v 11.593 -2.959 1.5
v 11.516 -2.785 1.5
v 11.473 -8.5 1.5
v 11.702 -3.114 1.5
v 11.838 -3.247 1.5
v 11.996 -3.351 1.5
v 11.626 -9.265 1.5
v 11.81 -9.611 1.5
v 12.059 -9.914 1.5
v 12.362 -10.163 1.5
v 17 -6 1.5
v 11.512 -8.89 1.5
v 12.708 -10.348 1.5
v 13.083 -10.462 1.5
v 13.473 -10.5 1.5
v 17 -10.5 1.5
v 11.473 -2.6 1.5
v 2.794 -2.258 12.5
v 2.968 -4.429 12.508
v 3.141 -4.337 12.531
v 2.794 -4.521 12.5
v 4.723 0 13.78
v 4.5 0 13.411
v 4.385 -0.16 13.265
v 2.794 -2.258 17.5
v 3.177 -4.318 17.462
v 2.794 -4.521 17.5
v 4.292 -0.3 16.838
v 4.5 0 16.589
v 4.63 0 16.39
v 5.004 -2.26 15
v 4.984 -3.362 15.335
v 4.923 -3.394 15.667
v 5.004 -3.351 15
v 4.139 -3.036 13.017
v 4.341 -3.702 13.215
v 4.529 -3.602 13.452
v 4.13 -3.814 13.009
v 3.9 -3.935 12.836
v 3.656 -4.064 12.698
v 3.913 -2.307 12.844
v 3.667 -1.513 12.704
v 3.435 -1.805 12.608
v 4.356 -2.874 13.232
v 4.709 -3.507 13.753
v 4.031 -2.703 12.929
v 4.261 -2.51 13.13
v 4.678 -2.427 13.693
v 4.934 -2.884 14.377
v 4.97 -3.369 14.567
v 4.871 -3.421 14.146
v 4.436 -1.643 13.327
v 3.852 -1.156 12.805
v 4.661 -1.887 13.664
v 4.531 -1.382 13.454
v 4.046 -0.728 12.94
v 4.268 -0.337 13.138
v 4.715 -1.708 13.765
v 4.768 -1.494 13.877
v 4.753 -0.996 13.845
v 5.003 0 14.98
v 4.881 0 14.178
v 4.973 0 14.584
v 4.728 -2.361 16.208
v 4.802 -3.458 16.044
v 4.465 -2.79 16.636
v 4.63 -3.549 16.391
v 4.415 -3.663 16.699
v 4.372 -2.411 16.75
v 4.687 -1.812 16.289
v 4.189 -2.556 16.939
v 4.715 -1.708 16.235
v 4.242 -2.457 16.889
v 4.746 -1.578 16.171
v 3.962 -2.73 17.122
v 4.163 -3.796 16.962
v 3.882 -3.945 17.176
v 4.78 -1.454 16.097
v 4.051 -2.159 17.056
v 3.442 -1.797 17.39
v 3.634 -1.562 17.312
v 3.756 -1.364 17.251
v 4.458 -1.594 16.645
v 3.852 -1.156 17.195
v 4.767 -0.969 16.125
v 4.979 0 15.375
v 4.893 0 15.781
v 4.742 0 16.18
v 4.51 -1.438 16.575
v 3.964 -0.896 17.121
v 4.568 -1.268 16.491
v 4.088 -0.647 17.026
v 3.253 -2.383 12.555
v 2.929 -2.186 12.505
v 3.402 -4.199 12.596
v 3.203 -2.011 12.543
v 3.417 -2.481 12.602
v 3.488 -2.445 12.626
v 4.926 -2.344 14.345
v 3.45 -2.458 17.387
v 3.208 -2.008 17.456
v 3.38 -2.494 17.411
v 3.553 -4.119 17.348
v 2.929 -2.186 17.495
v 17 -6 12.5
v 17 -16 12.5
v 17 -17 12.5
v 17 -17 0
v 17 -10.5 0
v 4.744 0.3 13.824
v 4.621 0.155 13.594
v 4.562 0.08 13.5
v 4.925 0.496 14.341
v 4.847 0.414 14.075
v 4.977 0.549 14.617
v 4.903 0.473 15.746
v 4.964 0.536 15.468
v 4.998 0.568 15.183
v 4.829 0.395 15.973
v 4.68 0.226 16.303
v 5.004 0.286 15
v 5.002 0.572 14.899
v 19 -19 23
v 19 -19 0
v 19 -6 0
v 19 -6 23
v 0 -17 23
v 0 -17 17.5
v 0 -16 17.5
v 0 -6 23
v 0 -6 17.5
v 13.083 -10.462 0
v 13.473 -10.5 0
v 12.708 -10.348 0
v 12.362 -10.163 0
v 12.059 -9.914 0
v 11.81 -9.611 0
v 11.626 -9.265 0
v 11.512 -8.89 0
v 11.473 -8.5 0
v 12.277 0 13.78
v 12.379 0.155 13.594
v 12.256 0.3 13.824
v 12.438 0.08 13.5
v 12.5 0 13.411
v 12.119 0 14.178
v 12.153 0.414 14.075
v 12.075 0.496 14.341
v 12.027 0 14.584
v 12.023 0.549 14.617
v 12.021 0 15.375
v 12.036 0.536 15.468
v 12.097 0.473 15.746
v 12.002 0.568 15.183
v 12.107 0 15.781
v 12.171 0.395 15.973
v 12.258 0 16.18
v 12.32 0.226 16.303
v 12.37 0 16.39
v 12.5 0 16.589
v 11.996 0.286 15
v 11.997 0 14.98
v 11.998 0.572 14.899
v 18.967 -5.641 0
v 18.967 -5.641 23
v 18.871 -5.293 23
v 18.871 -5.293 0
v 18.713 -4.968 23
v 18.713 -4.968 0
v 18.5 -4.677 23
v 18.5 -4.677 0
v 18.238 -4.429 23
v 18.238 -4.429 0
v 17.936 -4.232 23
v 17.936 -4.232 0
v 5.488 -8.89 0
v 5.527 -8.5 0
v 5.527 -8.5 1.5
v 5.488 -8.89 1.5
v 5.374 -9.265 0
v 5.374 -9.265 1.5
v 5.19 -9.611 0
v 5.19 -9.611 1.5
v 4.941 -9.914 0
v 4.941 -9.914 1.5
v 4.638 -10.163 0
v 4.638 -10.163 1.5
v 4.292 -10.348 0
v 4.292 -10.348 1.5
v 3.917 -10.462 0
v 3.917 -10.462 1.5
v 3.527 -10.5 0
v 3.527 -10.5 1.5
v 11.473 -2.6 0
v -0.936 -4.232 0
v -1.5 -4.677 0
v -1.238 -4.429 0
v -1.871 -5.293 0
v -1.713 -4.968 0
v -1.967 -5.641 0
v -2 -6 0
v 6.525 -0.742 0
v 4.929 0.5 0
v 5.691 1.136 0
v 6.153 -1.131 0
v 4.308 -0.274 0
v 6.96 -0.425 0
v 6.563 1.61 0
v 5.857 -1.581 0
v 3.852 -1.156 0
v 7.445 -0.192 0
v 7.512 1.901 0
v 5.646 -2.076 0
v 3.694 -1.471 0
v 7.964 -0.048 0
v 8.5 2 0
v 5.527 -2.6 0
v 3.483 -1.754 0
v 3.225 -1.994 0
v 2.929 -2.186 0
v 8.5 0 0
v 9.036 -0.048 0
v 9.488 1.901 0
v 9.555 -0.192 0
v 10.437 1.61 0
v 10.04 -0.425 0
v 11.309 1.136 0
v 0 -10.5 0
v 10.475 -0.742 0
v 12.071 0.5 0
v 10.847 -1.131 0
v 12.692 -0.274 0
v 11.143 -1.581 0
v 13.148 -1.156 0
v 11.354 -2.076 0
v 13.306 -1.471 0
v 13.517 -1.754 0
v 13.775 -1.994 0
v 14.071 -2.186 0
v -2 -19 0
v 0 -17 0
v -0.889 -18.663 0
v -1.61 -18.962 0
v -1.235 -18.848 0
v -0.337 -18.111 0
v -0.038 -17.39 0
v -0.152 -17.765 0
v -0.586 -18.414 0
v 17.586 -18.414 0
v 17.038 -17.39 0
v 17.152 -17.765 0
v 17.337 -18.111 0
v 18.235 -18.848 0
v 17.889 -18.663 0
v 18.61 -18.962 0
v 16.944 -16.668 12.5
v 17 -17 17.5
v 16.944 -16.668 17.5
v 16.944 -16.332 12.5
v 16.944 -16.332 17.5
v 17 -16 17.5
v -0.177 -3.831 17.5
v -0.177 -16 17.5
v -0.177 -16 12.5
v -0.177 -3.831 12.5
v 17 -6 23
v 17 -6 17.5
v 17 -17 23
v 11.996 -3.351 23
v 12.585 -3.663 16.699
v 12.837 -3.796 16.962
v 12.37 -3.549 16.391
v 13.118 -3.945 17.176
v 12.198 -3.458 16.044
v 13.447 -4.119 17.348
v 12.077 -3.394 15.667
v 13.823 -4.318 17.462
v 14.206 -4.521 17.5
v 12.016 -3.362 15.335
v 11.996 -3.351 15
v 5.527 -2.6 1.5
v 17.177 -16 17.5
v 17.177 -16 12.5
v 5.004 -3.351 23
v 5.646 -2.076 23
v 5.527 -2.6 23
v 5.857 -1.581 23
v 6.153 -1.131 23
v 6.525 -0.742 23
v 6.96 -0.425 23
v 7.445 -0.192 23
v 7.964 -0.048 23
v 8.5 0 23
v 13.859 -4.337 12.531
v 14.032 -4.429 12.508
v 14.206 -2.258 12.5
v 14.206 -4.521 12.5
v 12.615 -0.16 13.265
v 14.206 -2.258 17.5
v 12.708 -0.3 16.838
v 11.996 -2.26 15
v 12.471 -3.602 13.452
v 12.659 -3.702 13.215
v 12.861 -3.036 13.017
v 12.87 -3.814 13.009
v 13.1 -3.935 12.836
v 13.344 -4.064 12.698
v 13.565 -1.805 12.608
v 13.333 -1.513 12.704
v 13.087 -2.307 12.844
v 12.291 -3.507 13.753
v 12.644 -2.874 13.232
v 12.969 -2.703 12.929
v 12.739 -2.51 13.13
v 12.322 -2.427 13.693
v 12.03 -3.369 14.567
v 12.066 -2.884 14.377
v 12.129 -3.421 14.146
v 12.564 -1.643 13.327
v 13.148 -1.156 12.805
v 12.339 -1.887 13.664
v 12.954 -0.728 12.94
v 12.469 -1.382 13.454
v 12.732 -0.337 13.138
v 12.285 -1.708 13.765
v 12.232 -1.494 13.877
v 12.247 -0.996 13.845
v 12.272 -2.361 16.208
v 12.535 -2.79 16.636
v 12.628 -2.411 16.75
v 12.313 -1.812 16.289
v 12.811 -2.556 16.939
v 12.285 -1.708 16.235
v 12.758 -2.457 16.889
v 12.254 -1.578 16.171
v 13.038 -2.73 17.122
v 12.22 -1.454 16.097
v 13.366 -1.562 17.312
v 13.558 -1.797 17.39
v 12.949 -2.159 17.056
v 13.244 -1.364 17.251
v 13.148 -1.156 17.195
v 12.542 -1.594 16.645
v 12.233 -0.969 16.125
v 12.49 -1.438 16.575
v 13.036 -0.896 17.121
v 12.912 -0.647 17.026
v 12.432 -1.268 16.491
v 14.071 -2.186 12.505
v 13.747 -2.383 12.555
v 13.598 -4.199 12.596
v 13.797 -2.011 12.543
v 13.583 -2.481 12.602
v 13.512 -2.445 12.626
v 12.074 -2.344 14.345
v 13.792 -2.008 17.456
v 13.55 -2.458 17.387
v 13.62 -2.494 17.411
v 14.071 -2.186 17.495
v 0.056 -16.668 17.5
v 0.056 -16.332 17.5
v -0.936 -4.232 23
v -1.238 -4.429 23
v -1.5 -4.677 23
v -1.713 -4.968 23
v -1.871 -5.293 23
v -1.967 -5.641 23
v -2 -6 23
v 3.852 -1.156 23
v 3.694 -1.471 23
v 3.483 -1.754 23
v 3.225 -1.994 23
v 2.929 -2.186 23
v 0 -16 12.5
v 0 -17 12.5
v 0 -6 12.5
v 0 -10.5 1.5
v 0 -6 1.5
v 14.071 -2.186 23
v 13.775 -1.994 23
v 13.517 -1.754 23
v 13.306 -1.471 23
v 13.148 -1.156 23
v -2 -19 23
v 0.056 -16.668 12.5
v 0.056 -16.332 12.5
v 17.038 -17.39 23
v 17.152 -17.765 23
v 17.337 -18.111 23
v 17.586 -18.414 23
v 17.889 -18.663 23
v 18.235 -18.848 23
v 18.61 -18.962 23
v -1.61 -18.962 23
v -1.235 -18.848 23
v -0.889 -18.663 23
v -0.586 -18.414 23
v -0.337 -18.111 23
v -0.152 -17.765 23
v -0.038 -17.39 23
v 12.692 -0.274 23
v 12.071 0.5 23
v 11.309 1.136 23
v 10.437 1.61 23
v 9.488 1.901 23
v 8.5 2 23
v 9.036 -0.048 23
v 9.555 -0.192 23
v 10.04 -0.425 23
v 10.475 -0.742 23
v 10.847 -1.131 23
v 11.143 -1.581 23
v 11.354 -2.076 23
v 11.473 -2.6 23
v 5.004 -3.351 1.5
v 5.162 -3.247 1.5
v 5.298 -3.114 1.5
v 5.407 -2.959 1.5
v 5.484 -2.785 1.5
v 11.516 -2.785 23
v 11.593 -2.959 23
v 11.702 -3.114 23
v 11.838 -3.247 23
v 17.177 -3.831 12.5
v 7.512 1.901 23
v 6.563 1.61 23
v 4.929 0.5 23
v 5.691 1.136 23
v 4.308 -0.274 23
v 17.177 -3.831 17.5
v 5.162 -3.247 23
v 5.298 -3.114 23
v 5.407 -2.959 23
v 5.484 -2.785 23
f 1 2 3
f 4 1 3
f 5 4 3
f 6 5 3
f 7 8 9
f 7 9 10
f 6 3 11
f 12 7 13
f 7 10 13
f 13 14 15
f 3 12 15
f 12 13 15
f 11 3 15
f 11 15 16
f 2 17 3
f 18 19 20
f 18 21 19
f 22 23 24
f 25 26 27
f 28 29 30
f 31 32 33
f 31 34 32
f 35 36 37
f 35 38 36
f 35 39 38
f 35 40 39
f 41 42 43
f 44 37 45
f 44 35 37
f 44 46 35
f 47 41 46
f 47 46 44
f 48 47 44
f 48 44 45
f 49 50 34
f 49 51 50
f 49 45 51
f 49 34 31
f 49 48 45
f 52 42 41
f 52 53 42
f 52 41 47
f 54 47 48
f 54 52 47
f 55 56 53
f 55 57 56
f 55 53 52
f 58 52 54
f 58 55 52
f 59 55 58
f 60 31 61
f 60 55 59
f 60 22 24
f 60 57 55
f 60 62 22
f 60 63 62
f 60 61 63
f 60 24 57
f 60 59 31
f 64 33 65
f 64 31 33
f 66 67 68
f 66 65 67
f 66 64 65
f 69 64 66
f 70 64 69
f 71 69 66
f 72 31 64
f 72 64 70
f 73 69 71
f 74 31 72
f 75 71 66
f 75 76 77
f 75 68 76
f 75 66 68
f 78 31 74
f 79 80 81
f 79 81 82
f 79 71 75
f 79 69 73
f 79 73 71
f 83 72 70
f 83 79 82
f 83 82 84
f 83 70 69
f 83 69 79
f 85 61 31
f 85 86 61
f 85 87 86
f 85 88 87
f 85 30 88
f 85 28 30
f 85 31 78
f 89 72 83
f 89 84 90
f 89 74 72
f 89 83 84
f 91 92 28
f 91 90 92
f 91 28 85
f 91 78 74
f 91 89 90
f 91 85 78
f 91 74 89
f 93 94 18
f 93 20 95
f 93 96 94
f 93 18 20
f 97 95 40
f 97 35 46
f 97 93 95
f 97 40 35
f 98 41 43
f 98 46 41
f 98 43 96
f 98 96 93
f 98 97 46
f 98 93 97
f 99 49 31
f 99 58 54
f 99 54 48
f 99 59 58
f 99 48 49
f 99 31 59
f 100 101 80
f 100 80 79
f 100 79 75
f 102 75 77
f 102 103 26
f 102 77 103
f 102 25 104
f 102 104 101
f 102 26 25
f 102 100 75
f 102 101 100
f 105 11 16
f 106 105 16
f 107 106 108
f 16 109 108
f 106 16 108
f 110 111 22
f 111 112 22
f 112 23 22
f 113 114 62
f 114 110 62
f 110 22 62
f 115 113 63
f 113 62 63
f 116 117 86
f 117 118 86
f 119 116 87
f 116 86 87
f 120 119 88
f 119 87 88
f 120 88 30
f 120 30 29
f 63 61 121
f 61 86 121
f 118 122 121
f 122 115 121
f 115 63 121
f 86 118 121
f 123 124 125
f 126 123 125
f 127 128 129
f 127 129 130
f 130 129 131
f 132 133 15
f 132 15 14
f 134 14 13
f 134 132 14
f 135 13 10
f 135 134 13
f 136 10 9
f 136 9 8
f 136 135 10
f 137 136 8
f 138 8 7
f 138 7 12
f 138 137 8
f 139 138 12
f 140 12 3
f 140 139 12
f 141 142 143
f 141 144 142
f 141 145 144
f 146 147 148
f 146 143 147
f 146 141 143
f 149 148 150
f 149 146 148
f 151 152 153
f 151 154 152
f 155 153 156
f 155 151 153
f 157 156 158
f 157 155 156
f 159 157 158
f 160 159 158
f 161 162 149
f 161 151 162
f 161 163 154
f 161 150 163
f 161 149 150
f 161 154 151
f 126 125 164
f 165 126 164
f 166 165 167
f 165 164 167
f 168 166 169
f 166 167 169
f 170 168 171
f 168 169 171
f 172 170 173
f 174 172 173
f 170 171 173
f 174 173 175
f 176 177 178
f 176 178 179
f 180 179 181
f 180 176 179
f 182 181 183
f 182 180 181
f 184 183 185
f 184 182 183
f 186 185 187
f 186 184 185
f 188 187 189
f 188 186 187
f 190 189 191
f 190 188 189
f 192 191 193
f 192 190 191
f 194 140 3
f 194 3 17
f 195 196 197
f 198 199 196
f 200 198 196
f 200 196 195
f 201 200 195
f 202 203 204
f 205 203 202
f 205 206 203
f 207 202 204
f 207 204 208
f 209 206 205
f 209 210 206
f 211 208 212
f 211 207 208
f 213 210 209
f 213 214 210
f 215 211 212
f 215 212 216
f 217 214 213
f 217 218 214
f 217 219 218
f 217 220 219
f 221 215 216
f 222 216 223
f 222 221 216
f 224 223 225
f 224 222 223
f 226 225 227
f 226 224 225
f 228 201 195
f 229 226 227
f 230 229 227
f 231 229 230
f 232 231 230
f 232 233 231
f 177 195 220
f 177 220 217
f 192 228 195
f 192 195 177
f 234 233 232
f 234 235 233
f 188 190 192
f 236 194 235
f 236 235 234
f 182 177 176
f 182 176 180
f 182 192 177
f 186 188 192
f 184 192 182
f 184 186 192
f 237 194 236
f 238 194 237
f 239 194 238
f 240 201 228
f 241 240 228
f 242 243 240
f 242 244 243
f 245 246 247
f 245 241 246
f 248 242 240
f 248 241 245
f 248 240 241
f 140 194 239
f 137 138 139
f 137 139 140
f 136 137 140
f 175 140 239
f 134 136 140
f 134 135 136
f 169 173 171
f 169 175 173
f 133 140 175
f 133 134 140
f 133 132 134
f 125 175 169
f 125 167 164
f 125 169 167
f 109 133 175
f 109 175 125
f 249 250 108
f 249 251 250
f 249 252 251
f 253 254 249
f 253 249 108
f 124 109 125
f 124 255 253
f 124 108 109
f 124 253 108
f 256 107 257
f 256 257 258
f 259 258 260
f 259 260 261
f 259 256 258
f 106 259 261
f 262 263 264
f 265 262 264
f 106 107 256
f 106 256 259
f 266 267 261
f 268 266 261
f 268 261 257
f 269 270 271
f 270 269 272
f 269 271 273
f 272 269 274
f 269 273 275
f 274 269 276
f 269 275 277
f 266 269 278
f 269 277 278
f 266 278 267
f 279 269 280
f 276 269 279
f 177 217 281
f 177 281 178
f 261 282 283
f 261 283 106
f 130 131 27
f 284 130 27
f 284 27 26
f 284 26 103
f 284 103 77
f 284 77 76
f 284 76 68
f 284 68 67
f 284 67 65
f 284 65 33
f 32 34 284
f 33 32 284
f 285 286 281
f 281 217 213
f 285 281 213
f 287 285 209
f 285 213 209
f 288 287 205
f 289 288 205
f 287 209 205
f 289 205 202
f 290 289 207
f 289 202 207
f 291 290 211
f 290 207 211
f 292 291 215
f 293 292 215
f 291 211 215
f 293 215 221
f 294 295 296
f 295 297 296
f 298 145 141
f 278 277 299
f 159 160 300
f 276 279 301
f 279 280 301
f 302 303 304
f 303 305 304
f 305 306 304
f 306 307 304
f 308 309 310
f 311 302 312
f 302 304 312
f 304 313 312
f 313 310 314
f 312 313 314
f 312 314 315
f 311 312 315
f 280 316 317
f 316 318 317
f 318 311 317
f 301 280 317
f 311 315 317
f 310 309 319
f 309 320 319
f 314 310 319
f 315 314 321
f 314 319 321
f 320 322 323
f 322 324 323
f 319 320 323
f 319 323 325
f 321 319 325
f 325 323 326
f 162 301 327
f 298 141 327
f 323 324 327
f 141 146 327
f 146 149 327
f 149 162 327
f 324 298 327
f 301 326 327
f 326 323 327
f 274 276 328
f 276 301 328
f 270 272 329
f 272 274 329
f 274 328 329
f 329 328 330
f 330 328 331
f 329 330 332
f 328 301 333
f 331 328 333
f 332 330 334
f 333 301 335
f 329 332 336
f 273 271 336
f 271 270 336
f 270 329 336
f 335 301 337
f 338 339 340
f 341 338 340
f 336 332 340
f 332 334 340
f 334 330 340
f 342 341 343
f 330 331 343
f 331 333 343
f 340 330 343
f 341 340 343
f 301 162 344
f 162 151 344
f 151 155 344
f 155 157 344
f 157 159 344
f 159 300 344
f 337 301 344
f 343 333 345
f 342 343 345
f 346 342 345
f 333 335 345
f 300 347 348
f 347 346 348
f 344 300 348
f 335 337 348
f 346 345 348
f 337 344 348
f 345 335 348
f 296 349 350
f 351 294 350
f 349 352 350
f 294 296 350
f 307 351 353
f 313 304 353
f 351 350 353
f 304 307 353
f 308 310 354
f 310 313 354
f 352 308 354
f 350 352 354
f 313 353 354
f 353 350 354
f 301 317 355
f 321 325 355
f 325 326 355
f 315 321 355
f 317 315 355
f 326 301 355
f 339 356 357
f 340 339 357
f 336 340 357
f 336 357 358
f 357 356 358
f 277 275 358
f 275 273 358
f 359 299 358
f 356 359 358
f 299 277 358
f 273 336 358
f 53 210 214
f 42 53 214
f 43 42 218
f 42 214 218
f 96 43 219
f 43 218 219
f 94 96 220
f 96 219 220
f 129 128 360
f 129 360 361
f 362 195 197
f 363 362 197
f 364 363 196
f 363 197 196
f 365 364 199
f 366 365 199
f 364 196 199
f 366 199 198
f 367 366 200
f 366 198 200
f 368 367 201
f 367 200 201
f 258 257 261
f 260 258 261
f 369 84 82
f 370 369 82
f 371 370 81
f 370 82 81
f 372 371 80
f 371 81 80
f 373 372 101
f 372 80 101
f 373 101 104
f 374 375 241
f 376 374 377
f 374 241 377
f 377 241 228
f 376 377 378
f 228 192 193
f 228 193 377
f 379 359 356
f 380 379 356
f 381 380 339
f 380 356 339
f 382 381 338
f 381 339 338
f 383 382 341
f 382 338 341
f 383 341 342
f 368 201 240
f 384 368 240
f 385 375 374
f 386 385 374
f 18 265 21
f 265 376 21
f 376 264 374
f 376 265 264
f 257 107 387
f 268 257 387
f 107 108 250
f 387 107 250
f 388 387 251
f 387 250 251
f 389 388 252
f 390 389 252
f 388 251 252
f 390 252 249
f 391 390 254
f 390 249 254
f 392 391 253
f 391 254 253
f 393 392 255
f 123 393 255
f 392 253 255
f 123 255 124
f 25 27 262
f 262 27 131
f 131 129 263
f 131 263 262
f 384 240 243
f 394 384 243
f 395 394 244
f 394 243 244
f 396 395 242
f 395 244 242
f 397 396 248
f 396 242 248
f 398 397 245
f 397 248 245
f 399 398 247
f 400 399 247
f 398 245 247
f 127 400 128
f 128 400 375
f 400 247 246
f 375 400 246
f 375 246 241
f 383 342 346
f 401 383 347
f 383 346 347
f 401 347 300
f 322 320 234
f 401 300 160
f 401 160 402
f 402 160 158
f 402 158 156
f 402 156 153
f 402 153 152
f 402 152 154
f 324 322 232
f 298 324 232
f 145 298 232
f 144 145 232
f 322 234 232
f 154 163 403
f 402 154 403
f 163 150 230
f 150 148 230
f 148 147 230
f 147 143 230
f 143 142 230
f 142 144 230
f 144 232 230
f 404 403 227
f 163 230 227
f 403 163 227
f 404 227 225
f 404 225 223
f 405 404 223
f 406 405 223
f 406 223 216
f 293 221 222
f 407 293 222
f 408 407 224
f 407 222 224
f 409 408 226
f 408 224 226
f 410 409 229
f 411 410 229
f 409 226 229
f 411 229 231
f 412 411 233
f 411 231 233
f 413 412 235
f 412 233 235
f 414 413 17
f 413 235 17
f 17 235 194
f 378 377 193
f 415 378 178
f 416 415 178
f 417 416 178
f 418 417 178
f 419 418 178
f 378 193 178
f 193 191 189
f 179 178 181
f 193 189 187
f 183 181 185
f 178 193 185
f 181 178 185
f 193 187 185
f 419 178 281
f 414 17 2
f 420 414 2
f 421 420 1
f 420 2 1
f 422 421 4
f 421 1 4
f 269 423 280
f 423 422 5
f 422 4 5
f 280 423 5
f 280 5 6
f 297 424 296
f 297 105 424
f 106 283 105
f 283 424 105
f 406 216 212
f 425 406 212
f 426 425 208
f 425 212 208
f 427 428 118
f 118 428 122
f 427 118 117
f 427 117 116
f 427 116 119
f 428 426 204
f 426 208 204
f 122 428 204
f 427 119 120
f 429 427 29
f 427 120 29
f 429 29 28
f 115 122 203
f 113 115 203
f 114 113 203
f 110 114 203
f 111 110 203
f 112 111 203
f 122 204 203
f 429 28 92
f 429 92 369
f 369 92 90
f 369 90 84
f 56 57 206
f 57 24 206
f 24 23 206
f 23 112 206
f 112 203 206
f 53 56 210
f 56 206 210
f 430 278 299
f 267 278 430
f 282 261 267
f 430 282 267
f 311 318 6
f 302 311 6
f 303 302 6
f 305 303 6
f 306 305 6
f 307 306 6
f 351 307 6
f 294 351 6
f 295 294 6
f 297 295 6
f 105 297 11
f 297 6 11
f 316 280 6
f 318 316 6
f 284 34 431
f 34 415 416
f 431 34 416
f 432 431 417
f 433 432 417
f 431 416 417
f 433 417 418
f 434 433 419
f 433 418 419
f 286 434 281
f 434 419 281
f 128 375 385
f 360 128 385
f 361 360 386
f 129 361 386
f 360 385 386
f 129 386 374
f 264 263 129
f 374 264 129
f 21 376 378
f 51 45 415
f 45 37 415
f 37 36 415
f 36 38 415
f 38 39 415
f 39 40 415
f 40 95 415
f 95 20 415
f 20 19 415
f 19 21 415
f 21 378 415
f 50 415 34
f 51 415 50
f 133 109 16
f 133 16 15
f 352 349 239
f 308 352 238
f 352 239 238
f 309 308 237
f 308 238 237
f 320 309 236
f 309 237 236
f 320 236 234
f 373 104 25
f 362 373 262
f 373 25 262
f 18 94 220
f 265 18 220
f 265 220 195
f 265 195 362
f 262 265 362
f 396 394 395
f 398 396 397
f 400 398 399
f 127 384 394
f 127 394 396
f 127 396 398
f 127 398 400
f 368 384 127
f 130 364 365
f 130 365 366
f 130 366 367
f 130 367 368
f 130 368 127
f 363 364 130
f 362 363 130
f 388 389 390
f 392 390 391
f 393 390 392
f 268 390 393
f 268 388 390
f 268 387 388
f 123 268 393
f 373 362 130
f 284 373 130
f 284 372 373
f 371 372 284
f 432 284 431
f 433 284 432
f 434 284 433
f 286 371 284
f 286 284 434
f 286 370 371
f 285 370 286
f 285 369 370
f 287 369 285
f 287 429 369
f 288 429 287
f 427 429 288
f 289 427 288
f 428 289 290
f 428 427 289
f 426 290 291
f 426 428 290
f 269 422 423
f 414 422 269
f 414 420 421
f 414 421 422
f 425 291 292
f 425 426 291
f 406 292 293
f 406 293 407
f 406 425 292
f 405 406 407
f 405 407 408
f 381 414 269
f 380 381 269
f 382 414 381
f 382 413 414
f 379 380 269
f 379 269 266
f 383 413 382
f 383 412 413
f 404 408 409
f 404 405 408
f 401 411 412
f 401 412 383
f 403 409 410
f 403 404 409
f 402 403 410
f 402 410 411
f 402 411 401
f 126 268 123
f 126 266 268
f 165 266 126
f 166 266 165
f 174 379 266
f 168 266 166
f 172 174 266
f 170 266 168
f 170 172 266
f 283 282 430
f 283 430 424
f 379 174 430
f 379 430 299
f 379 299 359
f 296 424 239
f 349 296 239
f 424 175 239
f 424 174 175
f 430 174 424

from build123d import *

# Parameters (mm, degrees)
F1_DEPTH      = 23
F3_DEPTH      = 1.5
F6_DEPTH      = 16
F6_DEPTH_BACK = 5
F12_DEPTH     = 5


with BuildPart() as f1:
    # F0 (on Top) → F1 (new body)
    with BuildSketch(Plane.XY):
        with BuildLine():
            ThreePointArc((-2, -19), (-0.5857864376, -18.4142135624), (0, -17))
            Line((0, -17), (0, -6))
            Line((0, -6), (5.0035188667, -3.351078247))
            ThreePointArc((5.0035188667, -3.351078247), (5.3560027951, -3.039121038), (5.5267233597, -2.600467748))
            ThreePointArc((5.5267233597, -2.600467748), (6.5249806021, -0.7418373889), (8.5, 0))
            ThreePointArc((8.5, 0), (10.4750193979, -0.7418373889), (11.4732766403, -2.600467748))
            ThreePointArc((11.4732766403, -2.600467748), (11.6439972049, -3.039121038), (11.9964811333, -3.351078247))
            Line((11.9964811333, -3.351078247), (17, -6))
            Line((17, -6), (17, -17))
            ThreePointArc((17, -17), (17.5857864376, -18.4142135624), (19, -19))
            Line((19, -19), (19, -6))
            ThreePointArc((19, -6), (18.7134104706, -4.9683873987), (17.9357754408, -4.2324241673))
            Line((17.9357754408, -4.2324241673), (14.0709253105, -2.1863270395))
            ThreePointArc((14.0709253105, -2.1863270395), (13.5173932527, -1.7536531412), (13.1476433938, -1.156250862))
            ThreePointArc((13.1476433938, -1.156250862), (11.3090260154, 1.1363477665), (8.5, 2))
            ThreePointArc((8.5, 2), (5.6909739846, 1.1363477665), (3.8523566062, -1.156250862))
            ThreePointArc((3.8523566062, -1.156250862), (3.4826067473, -1.7536531412), (2.9290746895, -2.1863270395))
            Line((2.9290746895, -2.1863270395), (-0.9357754408, -4.2324241673))
            ThreePointArc((-0.9357754408, -4.2324241673), (-1.7134104706, -4.9683873987), (-2, -6))
            Line((-2, -6), (-2, -19))
        make_face()
    extrude(amount=F1_DEPTH)

    # F2 (on face) → F3 (join)
    with BuildSketch(Plane(origin=(0, 0, 0), x_dir=(1, 0, 0), z_dir=(0, 0, -1))):
        with BuildLine():
            Line((0, 10.5), (0, 6))
            Line((0, 6), (5.0035188667, 3.351078247))
            ThreePointArc((5.0035188667, 3.351078247), (5.3560027951, 3.039121038), (5.5267233597, 2.600467748))
            Line((5.5267233597, 2.600467748), (5.5267233597, 8.5))
            ThreePointArc((5.5267233597, 8.5), (4.9409369221, 9.9142135624), (3.5267233597, 10.5))
            Line((3.5267233597, 10.5), (0, 10.5))
        make_face()
        with BuildLine():
            Line((11.4732766403, 8.5), (11.4732766403, 2.600467748))
            ThreePointArc((11.4732766403, 2.600467748), (11.6439972049, 3.039121038), (11.9964811333, 3.351078247))
            Line((11.9964811333, 3.351078247), (17, 6))
            Line((17, 6), (17, 10.5))
            Line((17, 10.5), (13.4732766403, 10.5))
            ThreePointArc((13.4732766403, 10.5), (12.0590630779, 9.9142135624), (11.4732766403, 8.5))
        make_face()
    extrude(amount=-F3_DEPTH)


with BuildPart() as f6:
    # F5 (on Front) → F6 (new body, two sides)
    with BuildSketch(Plane.XZ) as f6_sk:
        with BuildLine():
            Line((-0.1767575833, 17.5), (-0.1767575833, 12.5))
            Line((-0.1767575833, 12.5), (0, 12.5))
            Line((0, 12.5), (2.7940490758, 12.5))
            add(Edge.make_bspline(
                [(2.7940490758, 12.5), (5.0035188667, 12.5), (5.0035188667, 15), (5.0035188667, 17.5), (2.7940490758, 17.5)],
                knots=[0, 0, 0, 1.5707963268, 1.5707963268, 3.1415926536, 3.1415926536, 3.1415926536], degree=2, weights=[1, 0.7071067812, 1, 0.7071067812, 1]))
            Line((2.7940490758, 17.5), (0, 17.5))
            Line((0, 17.5), (-0.1767575833, 17.5))
        make_face()
    extrude(amount=F6_DEPTH)
    extrude(f6_sk.sketch, amount=-F6_DEPTH_BACK)


with BuildPart() as f8_1:
    # F8: instance of F6
    add(f6.part.mirror(Plane.YZ.offset(8.5)))


with BuildPart() as f1_1:
    add(f1.part)

    # F9: cut F8_1, F6
    add(f8_1.part, mode=Mode.SUBTRACT)
    add(f6.part, mode=Mode.SUBTRACT)

    # F11 (on offset) → F12 (join)
    with BuildSketch(Plane.XY.offset(12.5)):
        with BuildLine():
            ThreePointArc((0, -17), (0.0635083269, -16.5), (0, -16))
            Line((0, -16), (0, -17))
        make_face()
    extrude(amount=F12_DEPTH)

    # F13: F1 across plane


with BuildPart() as f1_2:
    add(f1_1.part)
    add(f1_1.part.mirror(Plane.YZ.offset(8.5)))


solid = f1_2.part
